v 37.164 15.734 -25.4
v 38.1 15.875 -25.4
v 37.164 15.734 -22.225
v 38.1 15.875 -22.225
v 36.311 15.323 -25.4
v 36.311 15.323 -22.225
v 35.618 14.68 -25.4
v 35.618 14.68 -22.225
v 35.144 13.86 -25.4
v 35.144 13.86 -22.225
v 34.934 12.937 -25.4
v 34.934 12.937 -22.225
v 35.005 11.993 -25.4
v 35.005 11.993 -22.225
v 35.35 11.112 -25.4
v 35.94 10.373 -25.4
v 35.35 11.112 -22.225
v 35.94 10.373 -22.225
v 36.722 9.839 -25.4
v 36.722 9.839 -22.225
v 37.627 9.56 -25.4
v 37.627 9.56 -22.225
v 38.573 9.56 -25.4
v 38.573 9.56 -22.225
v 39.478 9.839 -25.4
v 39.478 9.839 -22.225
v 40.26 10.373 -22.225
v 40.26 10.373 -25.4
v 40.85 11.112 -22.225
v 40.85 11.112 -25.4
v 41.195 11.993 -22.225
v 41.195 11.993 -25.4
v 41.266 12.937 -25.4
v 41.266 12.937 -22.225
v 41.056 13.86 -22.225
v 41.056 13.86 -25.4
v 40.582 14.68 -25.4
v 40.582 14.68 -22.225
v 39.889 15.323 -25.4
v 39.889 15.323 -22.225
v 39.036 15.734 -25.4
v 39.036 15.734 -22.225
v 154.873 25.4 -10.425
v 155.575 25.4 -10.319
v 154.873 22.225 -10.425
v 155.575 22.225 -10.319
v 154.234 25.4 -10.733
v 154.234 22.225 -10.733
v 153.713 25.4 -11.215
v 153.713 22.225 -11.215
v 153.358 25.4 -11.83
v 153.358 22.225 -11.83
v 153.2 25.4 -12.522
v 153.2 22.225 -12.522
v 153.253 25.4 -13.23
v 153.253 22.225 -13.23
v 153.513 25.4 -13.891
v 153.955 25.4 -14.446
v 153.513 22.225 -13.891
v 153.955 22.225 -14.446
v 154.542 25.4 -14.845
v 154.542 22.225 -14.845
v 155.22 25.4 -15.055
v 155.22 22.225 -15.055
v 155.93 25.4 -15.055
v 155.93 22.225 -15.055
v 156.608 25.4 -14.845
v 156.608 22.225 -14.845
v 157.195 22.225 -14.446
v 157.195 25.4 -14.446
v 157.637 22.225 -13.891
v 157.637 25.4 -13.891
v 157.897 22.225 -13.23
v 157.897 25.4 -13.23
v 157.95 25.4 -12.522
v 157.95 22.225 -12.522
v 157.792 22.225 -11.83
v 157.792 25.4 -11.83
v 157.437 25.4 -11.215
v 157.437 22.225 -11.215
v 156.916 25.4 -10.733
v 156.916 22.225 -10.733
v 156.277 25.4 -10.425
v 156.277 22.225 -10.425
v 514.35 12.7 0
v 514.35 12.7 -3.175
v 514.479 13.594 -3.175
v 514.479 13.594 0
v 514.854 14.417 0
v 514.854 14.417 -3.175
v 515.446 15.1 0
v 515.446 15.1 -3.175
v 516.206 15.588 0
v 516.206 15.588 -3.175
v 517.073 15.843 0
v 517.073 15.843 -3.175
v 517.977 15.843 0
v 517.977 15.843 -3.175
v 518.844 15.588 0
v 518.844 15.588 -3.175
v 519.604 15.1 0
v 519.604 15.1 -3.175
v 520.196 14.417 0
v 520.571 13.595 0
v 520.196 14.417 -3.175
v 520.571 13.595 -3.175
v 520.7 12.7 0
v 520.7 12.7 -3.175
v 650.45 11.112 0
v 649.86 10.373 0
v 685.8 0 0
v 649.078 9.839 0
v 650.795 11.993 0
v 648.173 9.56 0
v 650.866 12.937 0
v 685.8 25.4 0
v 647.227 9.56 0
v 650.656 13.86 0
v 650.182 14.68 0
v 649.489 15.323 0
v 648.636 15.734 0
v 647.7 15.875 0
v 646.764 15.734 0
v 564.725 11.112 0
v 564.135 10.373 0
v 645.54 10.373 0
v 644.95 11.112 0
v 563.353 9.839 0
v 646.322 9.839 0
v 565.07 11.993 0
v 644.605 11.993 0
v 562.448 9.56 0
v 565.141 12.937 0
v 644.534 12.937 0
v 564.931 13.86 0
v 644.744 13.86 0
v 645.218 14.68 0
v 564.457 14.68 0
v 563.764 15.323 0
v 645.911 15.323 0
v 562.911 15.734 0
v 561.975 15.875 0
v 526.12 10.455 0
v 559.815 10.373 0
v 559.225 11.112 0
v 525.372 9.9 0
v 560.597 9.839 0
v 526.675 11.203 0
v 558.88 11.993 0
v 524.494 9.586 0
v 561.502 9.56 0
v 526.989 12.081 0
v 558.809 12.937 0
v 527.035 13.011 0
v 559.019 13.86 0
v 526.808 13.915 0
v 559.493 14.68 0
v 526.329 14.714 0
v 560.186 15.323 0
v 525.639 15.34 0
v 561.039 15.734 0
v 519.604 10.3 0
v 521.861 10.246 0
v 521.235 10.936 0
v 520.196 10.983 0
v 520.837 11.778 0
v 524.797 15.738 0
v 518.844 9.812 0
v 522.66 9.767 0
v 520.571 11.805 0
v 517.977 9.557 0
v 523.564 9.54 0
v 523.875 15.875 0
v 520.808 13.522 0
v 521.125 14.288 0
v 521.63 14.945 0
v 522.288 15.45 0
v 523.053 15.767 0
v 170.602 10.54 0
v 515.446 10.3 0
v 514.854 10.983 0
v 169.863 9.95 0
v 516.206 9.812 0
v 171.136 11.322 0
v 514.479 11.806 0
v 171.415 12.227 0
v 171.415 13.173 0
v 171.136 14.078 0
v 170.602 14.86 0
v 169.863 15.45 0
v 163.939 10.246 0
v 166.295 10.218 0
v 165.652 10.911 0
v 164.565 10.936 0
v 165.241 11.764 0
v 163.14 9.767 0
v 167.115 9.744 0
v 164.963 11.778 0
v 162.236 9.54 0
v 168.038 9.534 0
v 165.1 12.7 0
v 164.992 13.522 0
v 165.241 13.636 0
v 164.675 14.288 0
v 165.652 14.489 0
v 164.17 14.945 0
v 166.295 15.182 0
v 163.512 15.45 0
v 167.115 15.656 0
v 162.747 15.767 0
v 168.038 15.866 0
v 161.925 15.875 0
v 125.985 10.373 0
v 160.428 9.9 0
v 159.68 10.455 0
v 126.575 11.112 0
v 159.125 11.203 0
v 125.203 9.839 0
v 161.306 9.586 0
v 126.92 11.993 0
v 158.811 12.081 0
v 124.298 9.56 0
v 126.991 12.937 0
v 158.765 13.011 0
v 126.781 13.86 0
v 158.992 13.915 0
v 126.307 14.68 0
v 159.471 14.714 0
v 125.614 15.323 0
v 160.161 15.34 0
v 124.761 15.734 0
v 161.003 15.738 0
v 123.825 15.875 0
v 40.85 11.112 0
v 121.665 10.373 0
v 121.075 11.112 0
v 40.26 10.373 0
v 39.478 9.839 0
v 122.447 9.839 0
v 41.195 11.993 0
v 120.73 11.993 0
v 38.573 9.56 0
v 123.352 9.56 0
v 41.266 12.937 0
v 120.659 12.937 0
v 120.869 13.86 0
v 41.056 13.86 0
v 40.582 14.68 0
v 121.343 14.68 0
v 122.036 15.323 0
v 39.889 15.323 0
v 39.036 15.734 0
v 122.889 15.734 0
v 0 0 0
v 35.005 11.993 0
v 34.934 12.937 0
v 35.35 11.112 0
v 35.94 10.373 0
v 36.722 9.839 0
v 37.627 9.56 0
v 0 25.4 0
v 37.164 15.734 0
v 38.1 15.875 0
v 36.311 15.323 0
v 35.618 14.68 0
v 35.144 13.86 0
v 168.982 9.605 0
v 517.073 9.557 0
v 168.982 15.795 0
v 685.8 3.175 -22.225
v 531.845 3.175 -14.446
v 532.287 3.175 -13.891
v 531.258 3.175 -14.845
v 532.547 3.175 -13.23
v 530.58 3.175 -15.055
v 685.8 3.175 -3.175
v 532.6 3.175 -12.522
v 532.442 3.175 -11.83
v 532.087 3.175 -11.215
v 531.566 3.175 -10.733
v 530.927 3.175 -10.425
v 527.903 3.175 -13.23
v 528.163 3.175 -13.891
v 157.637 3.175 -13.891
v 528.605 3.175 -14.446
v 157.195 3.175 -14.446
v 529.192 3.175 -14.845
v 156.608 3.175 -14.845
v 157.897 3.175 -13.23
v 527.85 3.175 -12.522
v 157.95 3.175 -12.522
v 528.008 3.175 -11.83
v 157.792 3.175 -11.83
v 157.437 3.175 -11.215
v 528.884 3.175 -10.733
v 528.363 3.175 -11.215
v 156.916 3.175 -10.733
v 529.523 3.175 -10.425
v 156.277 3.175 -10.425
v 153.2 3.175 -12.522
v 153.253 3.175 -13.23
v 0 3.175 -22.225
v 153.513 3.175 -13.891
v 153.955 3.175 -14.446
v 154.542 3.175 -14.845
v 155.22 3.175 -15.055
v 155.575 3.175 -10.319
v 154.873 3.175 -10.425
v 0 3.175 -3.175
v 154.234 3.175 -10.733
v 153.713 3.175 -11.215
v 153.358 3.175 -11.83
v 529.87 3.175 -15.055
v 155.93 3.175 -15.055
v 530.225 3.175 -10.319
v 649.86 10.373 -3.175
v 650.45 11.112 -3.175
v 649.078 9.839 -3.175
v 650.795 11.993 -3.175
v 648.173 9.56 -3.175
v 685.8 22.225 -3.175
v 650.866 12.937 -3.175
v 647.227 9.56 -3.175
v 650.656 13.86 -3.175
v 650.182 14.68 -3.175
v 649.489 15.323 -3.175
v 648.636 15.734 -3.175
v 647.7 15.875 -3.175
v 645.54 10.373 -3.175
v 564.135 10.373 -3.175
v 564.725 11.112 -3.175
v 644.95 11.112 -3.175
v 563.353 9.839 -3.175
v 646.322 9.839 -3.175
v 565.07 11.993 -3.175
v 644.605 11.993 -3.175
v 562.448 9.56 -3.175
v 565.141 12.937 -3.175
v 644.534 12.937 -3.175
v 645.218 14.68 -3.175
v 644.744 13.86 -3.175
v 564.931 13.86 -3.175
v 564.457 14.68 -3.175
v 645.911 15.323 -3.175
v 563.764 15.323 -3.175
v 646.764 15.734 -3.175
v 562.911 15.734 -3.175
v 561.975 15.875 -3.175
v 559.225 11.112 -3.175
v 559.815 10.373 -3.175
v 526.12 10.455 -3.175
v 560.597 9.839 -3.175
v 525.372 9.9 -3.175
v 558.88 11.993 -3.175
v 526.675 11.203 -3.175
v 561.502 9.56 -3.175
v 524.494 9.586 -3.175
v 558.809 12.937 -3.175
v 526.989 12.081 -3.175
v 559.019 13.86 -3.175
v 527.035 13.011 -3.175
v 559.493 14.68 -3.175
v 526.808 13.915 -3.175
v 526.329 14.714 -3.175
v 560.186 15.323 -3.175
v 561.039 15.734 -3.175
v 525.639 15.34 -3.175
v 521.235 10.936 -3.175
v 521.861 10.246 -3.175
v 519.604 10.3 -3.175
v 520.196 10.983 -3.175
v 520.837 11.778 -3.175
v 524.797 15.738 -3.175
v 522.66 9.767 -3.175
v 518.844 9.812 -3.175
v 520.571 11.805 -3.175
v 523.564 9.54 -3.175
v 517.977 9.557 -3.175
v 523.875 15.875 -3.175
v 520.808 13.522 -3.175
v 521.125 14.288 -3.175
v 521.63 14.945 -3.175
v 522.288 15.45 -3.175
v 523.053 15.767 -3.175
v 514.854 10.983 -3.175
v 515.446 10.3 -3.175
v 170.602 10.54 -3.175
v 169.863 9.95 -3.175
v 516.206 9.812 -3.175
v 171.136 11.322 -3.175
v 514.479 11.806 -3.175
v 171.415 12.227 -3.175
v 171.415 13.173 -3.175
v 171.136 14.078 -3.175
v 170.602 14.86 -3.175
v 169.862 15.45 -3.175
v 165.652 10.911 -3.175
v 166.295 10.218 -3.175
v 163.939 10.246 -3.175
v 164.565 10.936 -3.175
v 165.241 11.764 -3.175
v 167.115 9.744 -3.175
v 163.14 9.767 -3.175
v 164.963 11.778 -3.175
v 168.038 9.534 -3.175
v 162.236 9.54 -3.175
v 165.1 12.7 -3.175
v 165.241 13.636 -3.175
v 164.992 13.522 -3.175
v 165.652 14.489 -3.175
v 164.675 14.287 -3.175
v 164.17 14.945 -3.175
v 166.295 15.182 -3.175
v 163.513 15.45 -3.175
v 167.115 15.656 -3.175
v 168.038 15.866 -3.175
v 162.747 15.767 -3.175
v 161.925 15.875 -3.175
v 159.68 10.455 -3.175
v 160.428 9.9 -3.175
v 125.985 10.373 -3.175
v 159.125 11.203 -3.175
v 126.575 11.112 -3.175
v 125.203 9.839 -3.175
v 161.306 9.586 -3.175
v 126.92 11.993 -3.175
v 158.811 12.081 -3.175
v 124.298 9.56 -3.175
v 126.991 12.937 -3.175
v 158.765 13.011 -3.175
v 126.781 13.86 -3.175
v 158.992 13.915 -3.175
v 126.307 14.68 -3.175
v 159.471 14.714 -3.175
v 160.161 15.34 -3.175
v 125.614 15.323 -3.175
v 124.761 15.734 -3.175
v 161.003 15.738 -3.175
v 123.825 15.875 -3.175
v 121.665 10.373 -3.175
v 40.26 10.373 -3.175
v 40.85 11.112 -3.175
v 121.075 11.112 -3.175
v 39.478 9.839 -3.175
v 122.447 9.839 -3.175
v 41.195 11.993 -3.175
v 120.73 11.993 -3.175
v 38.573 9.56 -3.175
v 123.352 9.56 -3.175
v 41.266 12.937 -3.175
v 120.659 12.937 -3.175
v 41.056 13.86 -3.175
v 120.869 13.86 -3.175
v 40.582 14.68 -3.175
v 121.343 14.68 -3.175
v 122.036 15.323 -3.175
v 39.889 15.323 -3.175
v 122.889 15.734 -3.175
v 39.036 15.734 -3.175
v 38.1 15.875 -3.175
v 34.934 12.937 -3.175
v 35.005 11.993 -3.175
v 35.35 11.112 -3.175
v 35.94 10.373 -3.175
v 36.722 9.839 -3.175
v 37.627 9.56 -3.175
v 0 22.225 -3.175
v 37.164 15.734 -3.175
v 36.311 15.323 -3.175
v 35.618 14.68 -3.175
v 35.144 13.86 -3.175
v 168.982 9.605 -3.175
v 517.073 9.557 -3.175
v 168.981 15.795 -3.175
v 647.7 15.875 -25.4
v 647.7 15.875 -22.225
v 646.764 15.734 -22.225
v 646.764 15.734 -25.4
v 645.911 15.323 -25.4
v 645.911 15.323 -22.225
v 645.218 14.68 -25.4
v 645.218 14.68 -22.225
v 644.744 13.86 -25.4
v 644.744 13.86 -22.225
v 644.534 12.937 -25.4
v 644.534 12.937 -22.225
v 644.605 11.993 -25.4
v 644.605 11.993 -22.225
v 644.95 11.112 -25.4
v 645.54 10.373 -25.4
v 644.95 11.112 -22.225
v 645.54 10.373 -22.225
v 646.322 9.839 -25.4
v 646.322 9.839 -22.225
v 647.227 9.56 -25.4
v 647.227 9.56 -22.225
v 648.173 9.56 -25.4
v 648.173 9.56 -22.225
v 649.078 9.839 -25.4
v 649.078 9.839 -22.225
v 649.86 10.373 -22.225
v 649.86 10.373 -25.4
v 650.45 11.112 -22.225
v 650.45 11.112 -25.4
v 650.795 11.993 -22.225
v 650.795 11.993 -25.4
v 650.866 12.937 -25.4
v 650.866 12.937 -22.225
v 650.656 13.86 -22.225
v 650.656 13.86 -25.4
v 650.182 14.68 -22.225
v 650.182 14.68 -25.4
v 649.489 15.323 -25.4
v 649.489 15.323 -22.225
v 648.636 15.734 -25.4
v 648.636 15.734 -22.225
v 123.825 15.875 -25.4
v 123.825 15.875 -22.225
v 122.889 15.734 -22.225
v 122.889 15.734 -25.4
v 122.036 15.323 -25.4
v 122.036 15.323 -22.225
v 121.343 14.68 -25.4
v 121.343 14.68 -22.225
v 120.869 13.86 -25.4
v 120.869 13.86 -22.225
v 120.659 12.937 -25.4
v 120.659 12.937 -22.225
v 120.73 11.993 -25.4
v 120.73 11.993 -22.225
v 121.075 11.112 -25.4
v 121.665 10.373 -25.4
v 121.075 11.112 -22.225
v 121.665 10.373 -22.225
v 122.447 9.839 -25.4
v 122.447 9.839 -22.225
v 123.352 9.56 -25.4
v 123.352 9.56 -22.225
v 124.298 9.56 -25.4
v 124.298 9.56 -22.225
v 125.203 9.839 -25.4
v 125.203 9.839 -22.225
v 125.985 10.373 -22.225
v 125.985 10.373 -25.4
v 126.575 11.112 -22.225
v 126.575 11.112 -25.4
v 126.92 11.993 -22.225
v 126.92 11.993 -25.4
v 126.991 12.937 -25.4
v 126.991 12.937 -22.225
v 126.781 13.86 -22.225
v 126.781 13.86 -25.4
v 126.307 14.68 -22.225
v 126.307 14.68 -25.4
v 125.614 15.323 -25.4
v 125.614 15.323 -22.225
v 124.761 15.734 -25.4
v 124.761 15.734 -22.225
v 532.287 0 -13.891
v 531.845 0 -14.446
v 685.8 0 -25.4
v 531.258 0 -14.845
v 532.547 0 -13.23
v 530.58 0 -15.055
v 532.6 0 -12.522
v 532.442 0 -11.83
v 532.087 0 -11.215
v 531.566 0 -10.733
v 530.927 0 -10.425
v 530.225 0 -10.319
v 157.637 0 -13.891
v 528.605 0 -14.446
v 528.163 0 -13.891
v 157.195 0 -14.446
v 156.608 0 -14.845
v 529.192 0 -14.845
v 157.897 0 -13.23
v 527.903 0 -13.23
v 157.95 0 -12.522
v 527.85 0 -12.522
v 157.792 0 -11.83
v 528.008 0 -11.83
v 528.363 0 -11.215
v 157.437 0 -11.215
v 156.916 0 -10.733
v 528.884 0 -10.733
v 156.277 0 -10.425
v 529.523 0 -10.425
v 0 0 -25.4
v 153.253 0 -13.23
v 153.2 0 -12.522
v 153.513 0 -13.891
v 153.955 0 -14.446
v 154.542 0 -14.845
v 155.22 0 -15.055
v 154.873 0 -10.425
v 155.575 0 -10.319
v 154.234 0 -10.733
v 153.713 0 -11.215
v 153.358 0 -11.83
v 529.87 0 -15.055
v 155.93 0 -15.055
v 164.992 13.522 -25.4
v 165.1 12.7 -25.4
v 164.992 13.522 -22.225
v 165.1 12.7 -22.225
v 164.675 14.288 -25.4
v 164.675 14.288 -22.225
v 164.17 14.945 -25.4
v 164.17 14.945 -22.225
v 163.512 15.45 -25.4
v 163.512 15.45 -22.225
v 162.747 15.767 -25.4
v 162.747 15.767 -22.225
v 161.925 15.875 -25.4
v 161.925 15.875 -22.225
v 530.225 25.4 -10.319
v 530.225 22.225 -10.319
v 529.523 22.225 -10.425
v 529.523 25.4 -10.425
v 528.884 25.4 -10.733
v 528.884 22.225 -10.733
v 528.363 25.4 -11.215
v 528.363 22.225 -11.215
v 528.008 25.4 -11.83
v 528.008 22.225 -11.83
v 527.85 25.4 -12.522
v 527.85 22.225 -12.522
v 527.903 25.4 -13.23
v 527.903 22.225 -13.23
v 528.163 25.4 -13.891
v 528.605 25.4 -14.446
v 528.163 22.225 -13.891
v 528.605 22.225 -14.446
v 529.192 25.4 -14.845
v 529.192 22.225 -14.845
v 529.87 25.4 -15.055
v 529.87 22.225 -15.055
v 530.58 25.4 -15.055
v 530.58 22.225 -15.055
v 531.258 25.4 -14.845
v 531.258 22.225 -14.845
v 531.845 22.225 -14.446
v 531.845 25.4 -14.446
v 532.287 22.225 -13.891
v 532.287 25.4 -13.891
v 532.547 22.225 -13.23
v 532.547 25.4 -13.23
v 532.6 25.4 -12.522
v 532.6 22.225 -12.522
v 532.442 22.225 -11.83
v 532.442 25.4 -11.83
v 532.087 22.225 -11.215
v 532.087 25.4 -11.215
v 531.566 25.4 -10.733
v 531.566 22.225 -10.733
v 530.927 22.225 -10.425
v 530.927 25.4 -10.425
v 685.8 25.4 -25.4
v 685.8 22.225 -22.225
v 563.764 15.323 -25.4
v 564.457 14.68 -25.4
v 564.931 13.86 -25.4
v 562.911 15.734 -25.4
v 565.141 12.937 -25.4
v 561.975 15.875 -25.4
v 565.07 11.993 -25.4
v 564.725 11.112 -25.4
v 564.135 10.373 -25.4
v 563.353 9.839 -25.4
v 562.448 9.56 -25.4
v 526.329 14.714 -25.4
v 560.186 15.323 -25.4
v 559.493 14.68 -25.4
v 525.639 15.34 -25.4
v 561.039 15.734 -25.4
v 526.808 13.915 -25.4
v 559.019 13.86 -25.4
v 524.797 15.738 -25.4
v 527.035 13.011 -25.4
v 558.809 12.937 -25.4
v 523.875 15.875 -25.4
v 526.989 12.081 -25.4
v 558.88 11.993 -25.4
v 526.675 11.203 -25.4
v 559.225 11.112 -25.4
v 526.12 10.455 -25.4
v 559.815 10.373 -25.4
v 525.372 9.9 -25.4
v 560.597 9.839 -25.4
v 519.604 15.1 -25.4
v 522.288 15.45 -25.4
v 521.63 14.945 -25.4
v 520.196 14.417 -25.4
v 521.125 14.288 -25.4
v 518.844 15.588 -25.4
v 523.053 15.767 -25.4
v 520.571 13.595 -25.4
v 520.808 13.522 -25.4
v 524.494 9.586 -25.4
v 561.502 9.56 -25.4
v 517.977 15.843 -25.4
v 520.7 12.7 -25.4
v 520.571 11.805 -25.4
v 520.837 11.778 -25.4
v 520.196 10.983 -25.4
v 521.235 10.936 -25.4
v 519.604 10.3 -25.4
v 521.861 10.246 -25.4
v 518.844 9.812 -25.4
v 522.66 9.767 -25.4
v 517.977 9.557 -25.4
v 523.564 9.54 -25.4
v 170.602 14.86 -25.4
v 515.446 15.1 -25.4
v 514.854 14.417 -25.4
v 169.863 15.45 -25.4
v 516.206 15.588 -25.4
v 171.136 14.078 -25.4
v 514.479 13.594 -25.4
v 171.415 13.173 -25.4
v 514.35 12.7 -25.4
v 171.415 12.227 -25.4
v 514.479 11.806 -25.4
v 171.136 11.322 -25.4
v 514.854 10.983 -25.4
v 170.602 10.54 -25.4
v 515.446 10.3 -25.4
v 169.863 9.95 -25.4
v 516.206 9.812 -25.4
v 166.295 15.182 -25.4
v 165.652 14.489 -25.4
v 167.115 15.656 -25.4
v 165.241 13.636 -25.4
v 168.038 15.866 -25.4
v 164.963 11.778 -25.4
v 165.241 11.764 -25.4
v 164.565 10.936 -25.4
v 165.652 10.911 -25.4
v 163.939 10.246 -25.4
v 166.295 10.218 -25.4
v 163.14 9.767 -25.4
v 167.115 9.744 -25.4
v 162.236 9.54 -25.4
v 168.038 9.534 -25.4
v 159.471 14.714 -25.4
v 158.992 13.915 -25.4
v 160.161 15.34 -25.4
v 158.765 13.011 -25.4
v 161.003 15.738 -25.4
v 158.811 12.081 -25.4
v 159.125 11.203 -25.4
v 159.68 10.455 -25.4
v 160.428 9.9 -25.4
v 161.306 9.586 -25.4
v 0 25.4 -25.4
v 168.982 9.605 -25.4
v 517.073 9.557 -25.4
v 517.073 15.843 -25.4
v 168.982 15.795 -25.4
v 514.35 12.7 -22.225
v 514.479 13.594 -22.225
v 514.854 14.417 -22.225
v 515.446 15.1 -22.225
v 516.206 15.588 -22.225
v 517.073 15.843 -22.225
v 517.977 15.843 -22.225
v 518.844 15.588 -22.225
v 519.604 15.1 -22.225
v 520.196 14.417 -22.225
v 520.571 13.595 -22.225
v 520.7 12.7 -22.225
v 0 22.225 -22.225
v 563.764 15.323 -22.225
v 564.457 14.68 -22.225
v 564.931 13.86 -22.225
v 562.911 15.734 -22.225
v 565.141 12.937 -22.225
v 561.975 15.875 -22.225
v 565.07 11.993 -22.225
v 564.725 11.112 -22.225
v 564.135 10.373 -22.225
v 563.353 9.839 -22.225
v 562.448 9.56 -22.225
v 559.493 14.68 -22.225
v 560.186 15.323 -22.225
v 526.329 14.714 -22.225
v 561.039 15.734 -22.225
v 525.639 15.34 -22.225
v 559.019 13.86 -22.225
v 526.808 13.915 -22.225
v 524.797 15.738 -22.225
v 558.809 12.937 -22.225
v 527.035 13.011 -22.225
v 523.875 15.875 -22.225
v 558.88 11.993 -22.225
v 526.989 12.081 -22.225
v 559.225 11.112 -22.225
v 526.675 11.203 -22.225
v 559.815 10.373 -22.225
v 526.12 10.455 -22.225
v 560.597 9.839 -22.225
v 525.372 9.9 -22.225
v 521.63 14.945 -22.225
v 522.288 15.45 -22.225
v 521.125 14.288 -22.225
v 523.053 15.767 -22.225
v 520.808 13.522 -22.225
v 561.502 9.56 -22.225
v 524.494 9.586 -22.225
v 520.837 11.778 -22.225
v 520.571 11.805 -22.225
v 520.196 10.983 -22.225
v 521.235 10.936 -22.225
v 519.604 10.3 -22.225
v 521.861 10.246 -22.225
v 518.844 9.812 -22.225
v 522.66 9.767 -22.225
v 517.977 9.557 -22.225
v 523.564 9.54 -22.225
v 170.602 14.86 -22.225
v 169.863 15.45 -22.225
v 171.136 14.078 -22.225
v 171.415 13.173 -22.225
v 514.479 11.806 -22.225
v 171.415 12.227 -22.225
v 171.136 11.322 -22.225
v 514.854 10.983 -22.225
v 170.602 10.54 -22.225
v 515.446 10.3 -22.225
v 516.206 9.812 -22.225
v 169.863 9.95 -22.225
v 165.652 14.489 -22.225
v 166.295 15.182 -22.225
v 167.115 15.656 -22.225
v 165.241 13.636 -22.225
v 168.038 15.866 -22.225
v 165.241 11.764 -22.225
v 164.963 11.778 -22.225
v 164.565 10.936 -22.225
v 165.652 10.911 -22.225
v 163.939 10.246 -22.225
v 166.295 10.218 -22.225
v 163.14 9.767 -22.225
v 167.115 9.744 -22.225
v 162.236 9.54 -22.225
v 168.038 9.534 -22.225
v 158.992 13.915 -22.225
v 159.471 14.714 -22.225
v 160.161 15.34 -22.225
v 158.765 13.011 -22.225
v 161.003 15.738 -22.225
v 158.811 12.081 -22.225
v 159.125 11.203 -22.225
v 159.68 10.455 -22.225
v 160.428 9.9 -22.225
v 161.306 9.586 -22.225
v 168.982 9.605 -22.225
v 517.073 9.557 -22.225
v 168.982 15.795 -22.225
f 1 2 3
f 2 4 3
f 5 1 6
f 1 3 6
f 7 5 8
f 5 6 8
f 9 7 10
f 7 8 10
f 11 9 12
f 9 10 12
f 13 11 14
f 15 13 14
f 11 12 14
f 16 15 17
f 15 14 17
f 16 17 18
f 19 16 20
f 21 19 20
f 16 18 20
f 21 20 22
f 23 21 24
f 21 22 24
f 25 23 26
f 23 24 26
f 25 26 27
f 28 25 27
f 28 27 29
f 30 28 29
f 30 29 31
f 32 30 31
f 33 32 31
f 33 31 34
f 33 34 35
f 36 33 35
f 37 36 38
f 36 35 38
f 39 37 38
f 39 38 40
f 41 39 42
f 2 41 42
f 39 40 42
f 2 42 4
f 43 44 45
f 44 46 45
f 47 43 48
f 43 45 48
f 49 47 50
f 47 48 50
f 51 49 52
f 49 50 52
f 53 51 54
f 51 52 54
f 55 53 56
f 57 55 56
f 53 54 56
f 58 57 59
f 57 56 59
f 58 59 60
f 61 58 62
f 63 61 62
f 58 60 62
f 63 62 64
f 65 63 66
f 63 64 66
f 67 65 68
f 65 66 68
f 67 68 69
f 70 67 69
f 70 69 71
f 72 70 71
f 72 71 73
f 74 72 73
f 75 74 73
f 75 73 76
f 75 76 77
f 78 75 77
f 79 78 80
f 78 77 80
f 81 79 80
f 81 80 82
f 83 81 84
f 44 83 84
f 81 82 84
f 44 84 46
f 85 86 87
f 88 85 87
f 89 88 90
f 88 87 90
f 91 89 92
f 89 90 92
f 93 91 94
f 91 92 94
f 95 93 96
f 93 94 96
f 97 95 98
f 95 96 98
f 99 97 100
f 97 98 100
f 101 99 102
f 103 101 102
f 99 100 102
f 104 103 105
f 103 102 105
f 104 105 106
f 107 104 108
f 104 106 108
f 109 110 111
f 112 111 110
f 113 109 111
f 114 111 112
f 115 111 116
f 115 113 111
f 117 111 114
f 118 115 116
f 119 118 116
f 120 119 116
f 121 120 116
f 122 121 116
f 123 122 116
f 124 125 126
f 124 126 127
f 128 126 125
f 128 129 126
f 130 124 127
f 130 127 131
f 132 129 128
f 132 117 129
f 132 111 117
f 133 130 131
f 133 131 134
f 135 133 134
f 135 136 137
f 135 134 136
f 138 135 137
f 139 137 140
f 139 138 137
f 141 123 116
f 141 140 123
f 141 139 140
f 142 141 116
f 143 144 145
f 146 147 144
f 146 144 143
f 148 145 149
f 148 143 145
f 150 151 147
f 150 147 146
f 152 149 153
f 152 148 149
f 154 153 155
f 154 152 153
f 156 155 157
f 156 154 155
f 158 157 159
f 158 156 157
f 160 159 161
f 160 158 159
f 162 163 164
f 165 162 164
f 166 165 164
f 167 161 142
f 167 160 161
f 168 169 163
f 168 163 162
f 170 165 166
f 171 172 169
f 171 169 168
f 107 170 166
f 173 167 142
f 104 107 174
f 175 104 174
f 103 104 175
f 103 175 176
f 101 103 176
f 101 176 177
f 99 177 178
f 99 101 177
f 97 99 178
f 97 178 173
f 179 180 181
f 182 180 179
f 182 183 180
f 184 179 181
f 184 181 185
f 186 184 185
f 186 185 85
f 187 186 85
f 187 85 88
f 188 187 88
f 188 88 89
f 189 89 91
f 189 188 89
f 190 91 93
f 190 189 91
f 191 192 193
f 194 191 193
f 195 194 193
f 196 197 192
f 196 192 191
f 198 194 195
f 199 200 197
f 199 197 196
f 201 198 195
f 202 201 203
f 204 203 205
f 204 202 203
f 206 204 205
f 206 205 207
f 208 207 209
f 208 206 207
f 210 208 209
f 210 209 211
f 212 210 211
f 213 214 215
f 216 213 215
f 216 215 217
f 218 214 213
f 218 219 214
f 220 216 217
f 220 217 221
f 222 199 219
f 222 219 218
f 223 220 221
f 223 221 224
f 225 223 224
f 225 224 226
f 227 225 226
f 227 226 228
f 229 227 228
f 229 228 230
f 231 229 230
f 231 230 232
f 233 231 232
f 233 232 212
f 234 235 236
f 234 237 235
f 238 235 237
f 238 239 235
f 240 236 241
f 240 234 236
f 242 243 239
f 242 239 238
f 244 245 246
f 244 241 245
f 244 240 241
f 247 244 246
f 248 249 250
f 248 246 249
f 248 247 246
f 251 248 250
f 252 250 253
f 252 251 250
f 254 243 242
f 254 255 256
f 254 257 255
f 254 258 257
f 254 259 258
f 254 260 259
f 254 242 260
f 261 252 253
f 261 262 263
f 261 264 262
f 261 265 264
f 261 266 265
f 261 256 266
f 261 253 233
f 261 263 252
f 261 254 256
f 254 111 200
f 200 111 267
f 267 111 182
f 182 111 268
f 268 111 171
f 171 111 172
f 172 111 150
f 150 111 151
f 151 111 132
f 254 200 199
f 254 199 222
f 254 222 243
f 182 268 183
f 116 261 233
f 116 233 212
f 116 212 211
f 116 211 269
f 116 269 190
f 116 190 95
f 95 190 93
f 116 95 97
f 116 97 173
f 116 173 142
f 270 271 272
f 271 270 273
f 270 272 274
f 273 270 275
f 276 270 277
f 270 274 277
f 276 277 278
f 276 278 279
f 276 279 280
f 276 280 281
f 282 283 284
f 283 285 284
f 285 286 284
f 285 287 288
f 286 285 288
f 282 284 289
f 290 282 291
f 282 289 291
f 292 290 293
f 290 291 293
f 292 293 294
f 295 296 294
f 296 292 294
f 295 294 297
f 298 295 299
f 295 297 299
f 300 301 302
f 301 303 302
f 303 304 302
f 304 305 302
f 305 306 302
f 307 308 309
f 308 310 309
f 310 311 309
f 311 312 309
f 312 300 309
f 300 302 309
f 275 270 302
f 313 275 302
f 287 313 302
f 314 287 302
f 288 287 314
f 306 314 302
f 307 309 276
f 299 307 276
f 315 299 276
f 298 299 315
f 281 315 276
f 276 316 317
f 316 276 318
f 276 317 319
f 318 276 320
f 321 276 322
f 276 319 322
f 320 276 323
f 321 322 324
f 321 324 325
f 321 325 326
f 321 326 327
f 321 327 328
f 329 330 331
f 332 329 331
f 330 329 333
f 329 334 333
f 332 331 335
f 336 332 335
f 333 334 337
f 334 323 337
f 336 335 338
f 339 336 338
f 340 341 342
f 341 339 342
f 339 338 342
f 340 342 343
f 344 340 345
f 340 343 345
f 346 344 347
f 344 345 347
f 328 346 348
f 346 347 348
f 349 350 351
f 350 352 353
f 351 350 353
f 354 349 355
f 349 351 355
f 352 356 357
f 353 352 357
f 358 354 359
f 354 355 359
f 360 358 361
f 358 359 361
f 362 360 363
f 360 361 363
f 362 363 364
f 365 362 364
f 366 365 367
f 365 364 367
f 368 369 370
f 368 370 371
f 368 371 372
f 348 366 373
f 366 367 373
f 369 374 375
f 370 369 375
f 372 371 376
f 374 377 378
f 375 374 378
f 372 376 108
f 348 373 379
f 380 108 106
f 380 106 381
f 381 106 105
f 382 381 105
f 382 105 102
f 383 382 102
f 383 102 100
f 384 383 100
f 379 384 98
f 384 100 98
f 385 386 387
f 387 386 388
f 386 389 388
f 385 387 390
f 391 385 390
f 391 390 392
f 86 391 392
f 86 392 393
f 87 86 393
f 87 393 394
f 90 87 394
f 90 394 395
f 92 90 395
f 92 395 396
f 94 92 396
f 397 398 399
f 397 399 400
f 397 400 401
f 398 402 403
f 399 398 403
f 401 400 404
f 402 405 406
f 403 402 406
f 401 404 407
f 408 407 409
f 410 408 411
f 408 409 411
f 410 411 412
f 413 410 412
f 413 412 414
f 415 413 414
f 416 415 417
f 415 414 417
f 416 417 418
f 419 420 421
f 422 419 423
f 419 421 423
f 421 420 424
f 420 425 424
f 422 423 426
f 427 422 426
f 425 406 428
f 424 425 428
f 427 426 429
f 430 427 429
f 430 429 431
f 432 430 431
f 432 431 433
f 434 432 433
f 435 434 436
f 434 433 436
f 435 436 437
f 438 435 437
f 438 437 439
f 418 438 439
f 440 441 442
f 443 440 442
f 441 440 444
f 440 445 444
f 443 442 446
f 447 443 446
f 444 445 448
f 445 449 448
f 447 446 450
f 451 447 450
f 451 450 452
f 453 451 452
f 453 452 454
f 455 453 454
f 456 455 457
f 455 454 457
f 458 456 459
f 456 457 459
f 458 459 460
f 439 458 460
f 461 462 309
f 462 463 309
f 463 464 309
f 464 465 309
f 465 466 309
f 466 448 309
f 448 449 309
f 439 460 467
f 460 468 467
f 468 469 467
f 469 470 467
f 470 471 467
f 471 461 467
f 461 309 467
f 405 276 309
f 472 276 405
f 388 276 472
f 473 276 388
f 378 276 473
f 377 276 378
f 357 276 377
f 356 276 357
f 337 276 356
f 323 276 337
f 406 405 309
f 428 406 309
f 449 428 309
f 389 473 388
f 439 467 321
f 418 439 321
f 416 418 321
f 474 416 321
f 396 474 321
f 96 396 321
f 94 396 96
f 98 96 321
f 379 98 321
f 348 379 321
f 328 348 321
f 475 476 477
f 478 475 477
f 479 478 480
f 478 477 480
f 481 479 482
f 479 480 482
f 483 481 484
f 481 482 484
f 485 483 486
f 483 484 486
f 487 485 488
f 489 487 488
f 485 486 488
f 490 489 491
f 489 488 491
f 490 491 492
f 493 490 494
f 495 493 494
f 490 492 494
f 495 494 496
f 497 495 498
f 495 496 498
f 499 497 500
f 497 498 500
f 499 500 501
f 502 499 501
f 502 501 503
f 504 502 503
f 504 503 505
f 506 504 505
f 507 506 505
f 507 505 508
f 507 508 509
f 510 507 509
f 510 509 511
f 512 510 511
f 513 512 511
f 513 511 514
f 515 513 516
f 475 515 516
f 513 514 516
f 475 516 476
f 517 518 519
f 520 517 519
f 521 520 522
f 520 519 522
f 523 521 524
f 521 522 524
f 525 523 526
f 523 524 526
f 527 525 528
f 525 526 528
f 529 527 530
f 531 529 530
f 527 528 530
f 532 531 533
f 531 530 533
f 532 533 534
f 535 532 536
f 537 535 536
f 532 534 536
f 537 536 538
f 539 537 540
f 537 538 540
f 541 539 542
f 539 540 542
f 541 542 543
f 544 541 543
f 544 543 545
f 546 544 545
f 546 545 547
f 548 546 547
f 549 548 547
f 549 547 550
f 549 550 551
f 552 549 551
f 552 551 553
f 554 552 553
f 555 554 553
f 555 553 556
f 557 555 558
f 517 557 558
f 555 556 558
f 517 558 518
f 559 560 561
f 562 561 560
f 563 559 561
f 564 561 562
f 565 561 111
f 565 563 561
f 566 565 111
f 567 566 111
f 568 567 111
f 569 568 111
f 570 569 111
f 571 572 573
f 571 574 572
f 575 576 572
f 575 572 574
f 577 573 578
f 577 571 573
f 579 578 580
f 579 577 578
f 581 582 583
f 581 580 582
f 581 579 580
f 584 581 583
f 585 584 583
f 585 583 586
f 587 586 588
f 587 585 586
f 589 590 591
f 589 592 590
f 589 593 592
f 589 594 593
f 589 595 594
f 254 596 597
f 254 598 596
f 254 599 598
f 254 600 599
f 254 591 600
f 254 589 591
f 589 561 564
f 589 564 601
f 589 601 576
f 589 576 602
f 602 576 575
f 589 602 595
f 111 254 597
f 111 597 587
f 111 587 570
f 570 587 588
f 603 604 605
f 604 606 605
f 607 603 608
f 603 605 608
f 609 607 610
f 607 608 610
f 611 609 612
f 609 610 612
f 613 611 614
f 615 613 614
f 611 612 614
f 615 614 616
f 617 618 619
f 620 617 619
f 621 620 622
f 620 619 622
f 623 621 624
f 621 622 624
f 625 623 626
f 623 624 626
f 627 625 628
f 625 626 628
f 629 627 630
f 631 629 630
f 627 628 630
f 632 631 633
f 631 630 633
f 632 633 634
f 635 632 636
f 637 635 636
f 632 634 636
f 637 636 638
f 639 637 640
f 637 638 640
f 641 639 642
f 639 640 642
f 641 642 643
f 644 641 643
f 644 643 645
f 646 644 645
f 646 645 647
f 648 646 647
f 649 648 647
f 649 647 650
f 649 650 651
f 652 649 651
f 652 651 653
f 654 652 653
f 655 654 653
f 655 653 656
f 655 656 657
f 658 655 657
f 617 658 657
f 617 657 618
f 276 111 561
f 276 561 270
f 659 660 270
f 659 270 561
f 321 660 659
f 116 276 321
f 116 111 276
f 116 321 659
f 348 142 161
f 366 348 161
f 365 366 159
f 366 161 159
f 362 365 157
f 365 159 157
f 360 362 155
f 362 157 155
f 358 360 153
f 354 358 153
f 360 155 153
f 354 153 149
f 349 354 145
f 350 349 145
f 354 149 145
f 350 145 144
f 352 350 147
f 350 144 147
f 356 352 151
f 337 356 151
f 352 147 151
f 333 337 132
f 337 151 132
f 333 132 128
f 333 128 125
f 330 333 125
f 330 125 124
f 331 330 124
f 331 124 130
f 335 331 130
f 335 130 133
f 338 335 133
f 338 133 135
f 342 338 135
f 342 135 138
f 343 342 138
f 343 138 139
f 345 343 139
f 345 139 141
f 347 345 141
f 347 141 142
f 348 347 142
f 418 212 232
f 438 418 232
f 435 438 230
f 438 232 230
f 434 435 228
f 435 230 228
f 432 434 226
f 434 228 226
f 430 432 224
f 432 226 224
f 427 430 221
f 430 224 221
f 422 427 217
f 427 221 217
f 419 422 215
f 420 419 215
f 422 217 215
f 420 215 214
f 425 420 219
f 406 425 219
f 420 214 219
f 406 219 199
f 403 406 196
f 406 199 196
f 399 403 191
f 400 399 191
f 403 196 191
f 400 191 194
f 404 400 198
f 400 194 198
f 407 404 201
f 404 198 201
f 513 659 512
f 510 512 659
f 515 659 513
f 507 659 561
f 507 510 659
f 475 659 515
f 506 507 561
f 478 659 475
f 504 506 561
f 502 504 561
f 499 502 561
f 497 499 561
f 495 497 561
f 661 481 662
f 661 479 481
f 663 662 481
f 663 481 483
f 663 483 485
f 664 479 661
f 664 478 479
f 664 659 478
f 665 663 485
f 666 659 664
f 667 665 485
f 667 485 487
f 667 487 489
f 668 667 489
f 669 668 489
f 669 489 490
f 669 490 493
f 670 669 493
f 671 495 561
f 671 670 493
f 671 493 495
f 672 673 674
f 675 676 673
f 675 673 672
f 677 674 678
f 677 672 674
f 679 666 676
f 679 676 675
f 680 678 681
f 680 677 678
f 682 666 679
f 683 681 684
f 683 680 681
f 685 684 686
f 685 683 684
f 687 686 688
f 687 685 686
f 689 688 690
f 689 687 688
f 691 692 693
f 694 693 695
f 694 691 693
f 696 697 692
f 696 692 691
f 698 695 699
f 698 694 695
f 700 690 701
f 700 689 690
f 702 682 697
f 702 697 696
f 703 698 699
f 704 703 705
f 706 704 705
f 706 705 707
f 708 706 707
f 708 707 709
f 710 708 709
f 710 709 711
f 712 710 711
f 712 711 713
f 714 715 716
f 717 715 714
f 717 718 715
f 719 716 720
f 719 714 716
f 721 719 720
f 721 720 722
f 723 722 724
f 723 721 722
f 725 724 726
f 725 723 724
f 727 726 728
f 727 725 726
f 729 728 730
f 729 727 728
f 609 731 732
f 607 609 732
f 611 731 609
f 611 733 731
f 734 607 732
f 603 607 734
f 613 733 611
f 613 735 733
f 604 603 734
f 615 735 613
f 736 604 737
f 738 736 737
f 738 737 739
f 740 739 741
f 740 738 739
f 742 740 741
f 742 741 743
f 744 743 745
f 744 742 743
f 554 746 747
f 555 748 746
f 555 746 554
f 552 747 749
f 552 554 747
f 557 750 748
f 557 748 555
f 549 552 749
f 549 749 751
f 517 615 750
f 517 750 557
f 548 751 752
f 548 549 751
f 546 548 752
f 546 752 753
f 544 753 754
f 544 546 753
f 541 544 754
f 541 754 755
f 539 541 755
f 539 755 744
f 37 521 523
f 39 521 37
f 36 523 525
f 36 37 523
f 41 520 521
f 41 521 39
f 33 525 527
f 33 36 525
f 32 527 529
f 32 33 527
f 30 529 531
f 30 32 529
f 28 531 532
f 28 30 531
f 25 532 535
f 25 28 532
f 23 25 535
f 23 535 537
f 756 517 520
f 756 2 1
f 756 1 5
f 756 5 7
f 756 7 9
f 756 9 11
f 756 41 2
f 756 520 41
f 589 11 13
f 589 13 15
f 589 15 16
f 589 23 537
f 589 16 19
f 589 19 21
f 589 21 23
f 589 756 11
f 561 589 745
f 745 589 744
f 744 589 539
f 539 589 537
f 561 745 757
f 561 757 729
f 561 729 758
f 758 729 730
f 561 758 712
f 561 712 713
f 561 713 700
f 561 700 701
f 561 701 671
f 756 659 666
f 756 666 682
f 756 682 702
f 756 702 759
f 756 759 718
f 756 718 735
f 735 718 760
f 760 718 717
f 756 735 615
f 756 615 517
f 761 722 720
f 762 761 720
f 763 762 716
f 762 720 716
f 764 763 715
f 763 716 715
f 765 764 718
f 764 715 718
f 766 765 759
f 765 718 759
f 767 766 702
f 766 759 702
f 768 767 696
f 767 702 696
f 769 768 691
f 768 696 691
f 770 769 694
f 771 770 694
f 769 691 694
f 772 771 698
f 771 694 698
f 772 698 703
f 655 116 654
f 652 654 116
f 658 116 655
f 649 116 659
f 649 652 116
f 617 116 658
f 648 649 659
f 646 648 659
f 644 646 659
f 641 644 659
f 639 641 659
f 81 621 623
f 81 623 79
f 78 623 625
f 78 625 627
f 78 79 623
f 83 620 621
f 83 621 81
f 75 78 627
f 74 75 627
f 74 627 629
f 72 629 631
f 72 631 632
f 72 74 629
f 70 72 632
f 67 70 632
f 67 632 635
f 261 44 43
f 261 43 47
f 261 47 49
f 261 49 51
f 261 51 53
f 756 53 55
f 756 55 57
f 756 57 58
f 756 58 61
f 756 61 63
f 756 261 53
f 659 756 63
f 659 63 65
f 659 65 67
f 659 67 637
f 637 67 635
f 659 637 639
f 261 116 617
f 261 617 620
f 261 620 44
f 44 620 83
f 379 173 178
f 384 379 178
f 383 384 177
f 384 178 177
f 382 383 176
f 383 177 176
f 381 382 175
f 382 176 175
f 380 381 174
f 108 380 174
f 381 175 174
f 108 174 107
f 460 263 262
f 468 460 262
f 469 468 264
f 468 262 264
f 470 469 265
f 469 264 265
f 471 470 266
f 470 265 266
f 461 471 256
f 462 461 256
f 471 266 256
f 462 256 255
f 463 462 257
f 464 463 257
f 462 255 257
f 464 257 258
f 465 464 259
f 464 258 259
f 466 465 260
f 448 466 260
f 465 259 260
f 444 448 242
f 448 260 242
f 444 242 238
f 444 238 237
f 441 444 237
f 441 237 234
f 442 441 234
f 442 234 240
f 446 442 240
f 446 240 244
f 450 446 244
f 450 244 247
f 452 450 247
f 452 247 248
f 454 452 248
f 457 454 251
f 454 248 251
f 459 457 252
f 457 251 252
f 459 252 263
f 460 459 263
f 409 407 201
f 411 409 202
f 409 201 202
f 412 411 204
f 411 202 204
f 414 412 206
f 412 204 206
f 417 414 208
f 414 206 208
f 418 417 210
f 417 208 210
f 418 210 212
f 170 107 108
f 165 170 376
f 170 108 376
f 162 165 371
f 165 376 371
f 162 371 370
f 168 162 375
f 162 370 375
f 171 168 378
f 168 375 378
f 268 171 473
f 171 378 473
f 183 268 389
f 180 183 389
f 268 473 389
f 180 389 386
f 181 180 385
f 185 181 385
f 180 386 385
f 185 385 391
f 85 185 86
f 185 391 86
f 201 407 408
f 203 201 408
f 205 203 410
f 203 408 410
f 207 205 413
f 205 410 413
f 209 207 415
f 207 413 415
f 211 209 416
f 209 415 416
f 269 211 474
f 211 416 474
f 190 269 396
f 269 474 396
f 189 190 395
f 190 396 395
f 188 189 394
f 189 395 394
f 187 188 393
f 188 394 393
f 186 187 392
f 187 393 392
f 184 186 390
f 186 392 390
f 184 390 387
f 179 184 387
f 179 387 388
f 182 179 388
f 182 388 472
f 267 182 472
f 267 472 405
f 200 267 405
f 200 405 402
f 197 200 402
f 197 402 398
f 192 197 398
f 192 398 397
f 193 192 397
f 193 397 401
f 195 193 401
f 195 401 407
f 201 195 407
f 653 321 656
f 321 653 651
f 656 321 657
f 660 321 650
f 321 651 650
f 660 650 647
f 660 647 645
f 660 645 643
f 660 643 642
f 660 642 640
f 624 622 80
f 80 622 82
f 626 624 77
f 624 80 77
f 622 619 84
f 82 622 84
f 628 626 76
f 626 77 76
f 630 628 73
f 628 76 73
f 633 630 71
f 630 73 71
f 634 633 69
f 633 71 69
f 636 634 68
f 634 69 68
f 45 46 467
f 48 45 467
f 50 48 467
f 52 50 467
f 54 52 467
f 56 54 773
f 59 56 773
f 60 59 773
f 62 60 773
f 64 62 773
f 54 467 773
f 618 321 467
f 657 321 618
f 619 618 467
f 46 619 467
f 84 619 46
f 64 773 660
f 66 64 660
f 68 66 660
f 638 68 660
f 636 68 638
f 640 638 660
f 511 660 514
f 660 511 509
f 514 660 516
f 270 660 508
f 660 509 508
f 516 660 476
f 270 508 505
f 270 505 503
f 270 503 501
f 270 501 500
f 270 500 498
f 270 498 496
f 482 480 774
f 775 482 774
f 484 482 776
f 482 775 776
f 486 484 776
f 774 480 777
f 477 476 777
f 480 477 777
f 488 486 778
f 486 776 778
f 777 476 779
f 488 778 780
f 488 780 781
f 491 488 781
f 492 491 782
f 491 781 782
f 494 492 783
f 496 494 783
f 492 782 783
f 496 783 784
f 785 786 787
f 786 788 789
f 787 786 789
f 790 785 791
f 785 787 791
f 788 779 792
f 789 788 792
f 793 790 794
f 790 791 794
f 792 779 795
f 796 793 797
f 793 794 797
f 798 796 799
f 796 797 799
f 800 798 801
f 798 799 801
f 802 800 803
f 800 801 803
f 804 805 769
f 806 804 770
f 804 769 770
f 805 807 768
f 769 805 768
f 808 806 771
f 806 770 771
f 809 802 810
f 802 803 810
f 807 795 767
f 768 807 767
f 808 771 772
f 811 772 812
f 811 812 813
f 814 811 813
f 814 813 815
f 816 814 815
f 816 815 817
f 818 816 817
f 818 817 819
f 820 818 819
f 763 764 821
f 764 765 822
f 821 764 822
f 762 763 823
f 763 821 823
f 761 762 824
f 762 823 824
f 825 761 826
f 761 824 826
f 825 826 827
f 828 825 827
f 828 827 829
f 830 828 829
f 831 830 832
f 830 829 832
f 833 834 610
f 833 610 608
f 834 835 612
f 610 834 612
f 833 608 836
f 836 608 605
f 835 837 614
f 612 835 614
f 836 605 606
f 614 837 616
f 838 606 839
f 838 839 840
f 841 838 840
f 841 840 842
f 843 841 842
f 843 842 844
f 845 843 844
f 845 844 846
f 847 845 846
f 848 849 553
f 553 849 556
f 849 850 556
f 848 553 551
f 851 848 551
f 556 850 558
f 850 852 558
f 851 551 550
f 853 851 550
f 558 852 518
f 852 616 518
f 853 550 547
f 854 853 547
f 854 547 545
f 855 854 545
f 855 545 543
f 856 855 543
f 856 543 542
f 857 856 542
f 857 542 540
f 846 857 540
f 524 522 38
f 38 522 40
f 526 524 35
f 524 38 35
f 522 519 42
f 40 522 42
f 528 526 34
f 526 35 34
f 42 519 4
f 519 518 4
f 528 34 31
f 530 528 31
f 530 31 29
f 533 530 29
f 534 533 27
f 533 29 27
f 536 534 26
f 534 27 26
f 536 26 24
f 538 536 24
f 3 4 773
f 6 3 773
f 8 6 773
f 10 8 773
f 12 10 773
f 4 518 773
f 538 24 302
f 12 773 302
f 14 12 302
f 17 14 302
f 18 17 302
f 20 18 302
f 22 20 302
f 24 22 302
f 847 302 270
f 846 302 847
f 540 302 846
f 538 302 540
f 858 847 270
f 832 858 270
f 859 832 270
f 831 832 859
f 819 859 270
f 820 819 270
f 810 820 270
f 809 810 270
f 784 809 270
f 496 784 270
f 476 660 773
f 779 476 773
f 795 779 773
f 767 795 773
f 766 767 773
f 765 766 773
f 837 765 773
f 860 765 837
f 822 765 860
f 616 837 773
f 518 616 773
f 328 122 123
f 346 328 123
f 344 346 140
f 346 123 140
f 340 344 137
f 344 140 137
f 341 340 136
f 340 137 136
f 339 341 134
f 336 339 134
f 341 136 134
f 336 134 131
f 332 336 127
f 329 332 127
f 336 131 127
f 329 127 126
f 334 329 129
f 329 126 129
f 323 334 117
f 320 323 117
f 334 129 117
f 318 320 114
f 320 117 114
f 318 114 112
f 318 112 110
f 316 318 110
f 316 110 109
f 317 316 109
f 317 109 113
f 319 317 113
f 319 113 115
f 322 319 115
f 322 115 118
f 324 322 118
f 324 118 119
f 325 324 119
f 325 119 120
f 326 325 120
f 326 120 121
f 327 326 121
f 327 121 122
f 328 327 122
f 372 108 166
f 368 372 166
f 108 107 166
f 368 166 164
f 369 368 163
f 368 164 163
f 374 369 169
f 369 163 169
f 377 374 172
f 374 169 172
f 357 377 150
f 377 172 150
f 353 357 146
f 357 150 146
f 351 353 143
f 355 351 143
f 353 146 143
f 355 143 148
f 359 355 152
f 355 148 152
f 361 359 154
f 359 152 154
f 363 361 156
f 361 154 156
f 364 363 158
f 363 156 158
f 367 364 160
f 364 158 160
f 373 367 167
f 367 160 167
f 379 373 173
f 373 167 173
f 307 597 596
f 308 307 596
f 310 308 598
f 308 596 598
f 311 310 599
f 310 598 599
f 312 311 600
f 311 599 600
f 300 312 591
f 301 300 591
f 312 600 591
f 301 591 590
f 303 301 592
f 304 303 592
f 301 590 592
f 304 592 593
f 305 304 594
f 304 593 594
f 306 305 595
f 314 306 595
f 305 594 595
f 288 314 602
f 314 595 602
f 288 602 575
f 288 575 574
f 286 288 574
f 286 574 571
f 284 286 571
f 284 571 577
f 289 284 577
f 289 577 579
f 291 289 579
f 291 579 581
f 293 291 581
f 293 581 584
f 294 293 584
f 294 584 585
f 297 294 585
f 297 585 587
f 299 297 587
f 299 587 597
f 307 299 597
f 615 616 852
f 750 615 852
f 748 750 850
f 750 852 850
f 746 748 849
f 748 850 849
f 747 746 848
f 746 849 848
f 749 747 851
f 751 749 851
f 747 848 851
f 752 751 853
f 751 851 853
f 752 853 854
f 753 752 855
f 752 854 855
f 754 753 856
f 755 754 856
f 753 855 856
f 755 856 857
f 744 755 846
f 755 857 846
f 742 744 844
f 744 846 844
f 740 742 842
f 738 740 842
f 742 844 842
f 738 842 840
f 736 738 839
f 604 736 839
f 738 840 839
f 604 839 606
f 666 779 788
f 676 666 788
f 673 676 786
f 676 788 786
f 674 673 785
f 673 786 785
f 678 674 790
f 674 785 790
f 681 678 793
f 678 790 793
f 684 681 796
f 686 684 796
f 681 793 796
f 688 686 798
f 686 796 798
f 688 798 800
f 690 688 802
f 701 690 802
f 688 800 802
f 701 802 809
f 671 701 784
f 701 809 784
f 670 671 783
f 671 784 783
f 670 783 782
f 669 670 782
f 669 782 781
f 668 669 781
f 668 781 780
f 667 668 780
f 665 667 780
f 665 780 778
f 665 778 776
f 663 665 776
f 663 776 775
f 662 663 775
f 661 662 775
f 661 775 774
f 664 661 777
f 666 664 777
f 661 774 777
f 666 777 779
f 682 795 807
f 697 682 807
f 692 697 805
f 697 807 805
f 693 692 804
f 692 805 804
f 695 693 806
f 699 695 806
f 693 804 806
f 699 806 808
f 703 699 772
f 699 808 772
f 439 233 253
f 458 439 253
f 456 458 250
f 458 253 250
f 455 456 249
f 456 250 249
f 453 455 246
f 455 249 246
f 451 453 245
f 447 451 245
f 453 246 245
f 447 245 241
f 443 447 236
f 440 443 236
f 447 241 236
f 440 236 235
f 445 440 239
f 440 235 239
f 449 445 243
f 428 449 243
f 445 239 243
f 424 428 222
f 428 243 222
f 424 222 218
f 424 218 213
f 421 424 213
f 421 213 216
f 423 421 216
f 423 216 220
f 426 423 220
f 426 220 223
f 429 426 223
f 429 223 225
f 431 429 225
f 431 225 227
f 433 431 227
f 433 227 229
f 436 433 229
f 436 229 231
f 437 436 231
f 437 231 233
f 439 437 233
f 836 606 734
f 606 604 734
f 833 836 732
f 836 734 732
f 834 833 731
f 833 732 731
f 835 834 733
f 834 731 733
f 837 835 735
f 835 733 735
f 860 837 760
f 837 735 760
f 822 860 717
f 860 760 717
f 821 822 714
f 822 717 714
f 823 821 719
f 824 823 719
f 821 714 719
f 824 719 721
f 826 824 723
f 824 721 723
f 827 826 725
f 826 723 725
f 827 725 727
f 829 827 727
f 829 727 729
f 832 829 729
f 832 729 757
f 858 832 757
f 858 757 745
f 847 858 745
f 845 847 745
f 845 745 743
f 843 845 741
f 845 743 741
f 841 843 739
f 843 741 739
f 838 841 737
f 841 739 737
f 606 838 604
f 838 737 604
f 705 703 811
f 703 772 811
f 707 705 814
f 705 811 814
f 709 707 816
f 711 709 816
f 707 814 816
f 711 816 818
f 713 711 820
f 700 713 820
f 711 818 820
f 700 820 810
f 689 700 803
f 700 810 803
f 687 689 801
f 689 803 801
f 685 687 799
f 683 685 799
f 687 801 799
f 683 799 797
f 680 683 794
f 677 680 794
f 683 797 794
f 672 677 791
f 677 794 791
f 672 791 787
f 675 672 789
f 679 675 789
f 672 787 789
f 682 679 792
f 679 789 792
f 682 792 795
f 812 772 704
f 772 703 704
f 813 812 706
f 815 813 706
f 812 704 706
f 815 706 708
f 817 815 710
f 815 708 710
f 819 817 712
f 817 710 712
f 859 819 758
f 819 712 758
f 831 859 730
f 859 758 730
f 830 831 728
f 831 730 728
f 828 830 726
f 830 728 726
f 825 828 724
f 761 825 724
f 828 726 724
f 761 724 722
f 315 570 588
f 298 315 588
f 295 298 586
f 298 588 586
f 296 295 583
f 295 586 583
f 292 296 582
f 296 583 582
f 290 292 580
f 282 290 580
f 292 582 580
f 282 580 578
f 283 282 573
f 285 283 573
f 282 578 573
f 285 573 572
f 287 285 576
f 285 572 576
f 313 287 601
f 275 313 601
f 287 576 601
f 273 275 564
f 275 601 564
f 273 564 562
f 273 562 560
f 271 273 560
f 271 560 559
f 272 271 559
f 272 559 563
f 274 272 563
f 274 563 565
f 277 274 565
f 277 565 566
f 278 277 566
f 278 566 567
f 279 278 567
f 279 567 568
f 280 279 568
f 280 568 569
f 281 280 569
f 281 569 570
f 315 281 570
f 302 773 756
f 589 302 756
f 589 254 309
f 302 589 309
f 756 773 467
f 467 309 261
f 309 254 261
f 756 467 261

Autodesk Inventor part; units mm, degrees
ref_plane "YZ Plane" through (0, 0, 0) normal (1, 0, 0) x (0, 1, 0)
ref_plane "XZ Plane" through (0, 0, 0) normal (0, 1, 0) x (-1, 0, 0)
ref_plane "XY Plane" through (0, 0, 0) normal (0, 0, 1) x (1, 0, 0)
sketch "Sketch1" plane through (0, 0, 0) normal (1, 0, 0) x (0, 1, 0)
  line L0 (0, 0) -> (25.4, 0)
  line L1 (25.4, 0) -> (25.4, -25.4)
  line L2 (25.4, -25.4) -> (0, -25.4)
  line L3 (0, -25.4) -> (0, 0)
  line L4 (3.175, -3.175) -> (22.225, -3.175)
  line L5 (22.225, -3.175) -> (22.225, -22.225)
  line L6 (22.225, -22.225) -> (3.175, -22.225)
  line L7 (3.175, -22.225) -> (3.175, -3.175)
  dimension "d0" = 25.4
  dimension "d1" = 25.4
  dimension "d2" = 19.05
  dimension "d3" = 19.05
  dimension "d4" = 3.175
  dimension "d5" = 3.175
extrude "Extrusion1" add sketch "Sketch1" along normal blind 685.8
sketch "Sketch3" plane through (0, 0, -25.4) normal (0, 0, -1) x (-1, 0, 0)
  line L0 (0, 25.4) -> (0, 0) projected
  line L1 (-685.8, 0) -> (-685.8, 25.4) projected
  line L2 (0, 0) -> (-685.8, 0) projected
  point P0 (-647.7, 12.7)
  point P1 (-561.975, 12.7)
  point P2 (-523.875, 12.7)
  point P3 (-161.925, 12.7)
  point P4 (-123.825, 12.7)
  point P5 (-38.1, 12.7)
  dimension "d23" = 38.1
  dimension "d24" = 12.7
  dimension "d25" = 12.7
  dimension "d26" = 12.7
  dimension "d27" = 123.825
  dimension "d28" = 161.925
  dimension "d29" = 12.7
  dimension "d30" = 12.7
  dimension "d31" = 12.7
  dimension "d32" = 38.1
  dimension "d33" = 123.825
  dimension "d34" = 161.925
hole "Hole2" at (647.7, 12.7, -25.4) at (561.975, 12.7, -25.4) at (523.875, 12.7, -25.4) at (161.925, 12.7, -25.4) at (123.825, 12.7, -25.4) at (38.1, 12.7, -25.4) direction (0, 0, 1) diameter 6.35 end through all
sketch "Sketch6" plane through (0, 0, -25.4) normal (0, 0, -1) x (-1, 0, 0)
  circle A0 centre (-523.875, 12.7) radius 3.175 projected
  circle A1 centre (-161.925, 12.7) radius 3.175 projected
  line L0 (0, 0) -> (-685.8, 0) projected
  circle A2 centre (-517.525, 12.7) radius 3.175
  circle A3 centre (-168.275, 12.7) radius 3.175
  dimension "d66" = 6.35
  dimension "d67" = 6.35
  dimension "d68" = 12.7
  dimension "d69" = 6.35
  dimension "d70" = 6.35
  dimension "d71" = 12.7
extrude "Extrusion2" cut sketch "Sketch6" against normal blind 25.4 contours A2 | A3
sketch "Sketch7" plane through (0, 25.4, 0) normal (0, 1, 0) x (1, 0, 0)
  line L0 (685.8, 25.4) -> (685.8, 0) projected
  line L1 (0, 25.4) -> (685.8, 25.4) projected
  point P0 (155.575, 12.7)
  point P1 (530.225, 12.7)
  dimension "d74" = 12.7
  dimension "d75" = 12.7
  dimension "d76" = 530.225
  dimension "d77" = 155.575
hole "Hole5" at (155.575, 25.4, -12.7) at (530.225, 25.4, -12.7) direction (0, -1, 0) diameter 4.7625 depth 25.4 tip angle 118
properties part number "1x1 horizontal lower" material "Aluminum 6061"
